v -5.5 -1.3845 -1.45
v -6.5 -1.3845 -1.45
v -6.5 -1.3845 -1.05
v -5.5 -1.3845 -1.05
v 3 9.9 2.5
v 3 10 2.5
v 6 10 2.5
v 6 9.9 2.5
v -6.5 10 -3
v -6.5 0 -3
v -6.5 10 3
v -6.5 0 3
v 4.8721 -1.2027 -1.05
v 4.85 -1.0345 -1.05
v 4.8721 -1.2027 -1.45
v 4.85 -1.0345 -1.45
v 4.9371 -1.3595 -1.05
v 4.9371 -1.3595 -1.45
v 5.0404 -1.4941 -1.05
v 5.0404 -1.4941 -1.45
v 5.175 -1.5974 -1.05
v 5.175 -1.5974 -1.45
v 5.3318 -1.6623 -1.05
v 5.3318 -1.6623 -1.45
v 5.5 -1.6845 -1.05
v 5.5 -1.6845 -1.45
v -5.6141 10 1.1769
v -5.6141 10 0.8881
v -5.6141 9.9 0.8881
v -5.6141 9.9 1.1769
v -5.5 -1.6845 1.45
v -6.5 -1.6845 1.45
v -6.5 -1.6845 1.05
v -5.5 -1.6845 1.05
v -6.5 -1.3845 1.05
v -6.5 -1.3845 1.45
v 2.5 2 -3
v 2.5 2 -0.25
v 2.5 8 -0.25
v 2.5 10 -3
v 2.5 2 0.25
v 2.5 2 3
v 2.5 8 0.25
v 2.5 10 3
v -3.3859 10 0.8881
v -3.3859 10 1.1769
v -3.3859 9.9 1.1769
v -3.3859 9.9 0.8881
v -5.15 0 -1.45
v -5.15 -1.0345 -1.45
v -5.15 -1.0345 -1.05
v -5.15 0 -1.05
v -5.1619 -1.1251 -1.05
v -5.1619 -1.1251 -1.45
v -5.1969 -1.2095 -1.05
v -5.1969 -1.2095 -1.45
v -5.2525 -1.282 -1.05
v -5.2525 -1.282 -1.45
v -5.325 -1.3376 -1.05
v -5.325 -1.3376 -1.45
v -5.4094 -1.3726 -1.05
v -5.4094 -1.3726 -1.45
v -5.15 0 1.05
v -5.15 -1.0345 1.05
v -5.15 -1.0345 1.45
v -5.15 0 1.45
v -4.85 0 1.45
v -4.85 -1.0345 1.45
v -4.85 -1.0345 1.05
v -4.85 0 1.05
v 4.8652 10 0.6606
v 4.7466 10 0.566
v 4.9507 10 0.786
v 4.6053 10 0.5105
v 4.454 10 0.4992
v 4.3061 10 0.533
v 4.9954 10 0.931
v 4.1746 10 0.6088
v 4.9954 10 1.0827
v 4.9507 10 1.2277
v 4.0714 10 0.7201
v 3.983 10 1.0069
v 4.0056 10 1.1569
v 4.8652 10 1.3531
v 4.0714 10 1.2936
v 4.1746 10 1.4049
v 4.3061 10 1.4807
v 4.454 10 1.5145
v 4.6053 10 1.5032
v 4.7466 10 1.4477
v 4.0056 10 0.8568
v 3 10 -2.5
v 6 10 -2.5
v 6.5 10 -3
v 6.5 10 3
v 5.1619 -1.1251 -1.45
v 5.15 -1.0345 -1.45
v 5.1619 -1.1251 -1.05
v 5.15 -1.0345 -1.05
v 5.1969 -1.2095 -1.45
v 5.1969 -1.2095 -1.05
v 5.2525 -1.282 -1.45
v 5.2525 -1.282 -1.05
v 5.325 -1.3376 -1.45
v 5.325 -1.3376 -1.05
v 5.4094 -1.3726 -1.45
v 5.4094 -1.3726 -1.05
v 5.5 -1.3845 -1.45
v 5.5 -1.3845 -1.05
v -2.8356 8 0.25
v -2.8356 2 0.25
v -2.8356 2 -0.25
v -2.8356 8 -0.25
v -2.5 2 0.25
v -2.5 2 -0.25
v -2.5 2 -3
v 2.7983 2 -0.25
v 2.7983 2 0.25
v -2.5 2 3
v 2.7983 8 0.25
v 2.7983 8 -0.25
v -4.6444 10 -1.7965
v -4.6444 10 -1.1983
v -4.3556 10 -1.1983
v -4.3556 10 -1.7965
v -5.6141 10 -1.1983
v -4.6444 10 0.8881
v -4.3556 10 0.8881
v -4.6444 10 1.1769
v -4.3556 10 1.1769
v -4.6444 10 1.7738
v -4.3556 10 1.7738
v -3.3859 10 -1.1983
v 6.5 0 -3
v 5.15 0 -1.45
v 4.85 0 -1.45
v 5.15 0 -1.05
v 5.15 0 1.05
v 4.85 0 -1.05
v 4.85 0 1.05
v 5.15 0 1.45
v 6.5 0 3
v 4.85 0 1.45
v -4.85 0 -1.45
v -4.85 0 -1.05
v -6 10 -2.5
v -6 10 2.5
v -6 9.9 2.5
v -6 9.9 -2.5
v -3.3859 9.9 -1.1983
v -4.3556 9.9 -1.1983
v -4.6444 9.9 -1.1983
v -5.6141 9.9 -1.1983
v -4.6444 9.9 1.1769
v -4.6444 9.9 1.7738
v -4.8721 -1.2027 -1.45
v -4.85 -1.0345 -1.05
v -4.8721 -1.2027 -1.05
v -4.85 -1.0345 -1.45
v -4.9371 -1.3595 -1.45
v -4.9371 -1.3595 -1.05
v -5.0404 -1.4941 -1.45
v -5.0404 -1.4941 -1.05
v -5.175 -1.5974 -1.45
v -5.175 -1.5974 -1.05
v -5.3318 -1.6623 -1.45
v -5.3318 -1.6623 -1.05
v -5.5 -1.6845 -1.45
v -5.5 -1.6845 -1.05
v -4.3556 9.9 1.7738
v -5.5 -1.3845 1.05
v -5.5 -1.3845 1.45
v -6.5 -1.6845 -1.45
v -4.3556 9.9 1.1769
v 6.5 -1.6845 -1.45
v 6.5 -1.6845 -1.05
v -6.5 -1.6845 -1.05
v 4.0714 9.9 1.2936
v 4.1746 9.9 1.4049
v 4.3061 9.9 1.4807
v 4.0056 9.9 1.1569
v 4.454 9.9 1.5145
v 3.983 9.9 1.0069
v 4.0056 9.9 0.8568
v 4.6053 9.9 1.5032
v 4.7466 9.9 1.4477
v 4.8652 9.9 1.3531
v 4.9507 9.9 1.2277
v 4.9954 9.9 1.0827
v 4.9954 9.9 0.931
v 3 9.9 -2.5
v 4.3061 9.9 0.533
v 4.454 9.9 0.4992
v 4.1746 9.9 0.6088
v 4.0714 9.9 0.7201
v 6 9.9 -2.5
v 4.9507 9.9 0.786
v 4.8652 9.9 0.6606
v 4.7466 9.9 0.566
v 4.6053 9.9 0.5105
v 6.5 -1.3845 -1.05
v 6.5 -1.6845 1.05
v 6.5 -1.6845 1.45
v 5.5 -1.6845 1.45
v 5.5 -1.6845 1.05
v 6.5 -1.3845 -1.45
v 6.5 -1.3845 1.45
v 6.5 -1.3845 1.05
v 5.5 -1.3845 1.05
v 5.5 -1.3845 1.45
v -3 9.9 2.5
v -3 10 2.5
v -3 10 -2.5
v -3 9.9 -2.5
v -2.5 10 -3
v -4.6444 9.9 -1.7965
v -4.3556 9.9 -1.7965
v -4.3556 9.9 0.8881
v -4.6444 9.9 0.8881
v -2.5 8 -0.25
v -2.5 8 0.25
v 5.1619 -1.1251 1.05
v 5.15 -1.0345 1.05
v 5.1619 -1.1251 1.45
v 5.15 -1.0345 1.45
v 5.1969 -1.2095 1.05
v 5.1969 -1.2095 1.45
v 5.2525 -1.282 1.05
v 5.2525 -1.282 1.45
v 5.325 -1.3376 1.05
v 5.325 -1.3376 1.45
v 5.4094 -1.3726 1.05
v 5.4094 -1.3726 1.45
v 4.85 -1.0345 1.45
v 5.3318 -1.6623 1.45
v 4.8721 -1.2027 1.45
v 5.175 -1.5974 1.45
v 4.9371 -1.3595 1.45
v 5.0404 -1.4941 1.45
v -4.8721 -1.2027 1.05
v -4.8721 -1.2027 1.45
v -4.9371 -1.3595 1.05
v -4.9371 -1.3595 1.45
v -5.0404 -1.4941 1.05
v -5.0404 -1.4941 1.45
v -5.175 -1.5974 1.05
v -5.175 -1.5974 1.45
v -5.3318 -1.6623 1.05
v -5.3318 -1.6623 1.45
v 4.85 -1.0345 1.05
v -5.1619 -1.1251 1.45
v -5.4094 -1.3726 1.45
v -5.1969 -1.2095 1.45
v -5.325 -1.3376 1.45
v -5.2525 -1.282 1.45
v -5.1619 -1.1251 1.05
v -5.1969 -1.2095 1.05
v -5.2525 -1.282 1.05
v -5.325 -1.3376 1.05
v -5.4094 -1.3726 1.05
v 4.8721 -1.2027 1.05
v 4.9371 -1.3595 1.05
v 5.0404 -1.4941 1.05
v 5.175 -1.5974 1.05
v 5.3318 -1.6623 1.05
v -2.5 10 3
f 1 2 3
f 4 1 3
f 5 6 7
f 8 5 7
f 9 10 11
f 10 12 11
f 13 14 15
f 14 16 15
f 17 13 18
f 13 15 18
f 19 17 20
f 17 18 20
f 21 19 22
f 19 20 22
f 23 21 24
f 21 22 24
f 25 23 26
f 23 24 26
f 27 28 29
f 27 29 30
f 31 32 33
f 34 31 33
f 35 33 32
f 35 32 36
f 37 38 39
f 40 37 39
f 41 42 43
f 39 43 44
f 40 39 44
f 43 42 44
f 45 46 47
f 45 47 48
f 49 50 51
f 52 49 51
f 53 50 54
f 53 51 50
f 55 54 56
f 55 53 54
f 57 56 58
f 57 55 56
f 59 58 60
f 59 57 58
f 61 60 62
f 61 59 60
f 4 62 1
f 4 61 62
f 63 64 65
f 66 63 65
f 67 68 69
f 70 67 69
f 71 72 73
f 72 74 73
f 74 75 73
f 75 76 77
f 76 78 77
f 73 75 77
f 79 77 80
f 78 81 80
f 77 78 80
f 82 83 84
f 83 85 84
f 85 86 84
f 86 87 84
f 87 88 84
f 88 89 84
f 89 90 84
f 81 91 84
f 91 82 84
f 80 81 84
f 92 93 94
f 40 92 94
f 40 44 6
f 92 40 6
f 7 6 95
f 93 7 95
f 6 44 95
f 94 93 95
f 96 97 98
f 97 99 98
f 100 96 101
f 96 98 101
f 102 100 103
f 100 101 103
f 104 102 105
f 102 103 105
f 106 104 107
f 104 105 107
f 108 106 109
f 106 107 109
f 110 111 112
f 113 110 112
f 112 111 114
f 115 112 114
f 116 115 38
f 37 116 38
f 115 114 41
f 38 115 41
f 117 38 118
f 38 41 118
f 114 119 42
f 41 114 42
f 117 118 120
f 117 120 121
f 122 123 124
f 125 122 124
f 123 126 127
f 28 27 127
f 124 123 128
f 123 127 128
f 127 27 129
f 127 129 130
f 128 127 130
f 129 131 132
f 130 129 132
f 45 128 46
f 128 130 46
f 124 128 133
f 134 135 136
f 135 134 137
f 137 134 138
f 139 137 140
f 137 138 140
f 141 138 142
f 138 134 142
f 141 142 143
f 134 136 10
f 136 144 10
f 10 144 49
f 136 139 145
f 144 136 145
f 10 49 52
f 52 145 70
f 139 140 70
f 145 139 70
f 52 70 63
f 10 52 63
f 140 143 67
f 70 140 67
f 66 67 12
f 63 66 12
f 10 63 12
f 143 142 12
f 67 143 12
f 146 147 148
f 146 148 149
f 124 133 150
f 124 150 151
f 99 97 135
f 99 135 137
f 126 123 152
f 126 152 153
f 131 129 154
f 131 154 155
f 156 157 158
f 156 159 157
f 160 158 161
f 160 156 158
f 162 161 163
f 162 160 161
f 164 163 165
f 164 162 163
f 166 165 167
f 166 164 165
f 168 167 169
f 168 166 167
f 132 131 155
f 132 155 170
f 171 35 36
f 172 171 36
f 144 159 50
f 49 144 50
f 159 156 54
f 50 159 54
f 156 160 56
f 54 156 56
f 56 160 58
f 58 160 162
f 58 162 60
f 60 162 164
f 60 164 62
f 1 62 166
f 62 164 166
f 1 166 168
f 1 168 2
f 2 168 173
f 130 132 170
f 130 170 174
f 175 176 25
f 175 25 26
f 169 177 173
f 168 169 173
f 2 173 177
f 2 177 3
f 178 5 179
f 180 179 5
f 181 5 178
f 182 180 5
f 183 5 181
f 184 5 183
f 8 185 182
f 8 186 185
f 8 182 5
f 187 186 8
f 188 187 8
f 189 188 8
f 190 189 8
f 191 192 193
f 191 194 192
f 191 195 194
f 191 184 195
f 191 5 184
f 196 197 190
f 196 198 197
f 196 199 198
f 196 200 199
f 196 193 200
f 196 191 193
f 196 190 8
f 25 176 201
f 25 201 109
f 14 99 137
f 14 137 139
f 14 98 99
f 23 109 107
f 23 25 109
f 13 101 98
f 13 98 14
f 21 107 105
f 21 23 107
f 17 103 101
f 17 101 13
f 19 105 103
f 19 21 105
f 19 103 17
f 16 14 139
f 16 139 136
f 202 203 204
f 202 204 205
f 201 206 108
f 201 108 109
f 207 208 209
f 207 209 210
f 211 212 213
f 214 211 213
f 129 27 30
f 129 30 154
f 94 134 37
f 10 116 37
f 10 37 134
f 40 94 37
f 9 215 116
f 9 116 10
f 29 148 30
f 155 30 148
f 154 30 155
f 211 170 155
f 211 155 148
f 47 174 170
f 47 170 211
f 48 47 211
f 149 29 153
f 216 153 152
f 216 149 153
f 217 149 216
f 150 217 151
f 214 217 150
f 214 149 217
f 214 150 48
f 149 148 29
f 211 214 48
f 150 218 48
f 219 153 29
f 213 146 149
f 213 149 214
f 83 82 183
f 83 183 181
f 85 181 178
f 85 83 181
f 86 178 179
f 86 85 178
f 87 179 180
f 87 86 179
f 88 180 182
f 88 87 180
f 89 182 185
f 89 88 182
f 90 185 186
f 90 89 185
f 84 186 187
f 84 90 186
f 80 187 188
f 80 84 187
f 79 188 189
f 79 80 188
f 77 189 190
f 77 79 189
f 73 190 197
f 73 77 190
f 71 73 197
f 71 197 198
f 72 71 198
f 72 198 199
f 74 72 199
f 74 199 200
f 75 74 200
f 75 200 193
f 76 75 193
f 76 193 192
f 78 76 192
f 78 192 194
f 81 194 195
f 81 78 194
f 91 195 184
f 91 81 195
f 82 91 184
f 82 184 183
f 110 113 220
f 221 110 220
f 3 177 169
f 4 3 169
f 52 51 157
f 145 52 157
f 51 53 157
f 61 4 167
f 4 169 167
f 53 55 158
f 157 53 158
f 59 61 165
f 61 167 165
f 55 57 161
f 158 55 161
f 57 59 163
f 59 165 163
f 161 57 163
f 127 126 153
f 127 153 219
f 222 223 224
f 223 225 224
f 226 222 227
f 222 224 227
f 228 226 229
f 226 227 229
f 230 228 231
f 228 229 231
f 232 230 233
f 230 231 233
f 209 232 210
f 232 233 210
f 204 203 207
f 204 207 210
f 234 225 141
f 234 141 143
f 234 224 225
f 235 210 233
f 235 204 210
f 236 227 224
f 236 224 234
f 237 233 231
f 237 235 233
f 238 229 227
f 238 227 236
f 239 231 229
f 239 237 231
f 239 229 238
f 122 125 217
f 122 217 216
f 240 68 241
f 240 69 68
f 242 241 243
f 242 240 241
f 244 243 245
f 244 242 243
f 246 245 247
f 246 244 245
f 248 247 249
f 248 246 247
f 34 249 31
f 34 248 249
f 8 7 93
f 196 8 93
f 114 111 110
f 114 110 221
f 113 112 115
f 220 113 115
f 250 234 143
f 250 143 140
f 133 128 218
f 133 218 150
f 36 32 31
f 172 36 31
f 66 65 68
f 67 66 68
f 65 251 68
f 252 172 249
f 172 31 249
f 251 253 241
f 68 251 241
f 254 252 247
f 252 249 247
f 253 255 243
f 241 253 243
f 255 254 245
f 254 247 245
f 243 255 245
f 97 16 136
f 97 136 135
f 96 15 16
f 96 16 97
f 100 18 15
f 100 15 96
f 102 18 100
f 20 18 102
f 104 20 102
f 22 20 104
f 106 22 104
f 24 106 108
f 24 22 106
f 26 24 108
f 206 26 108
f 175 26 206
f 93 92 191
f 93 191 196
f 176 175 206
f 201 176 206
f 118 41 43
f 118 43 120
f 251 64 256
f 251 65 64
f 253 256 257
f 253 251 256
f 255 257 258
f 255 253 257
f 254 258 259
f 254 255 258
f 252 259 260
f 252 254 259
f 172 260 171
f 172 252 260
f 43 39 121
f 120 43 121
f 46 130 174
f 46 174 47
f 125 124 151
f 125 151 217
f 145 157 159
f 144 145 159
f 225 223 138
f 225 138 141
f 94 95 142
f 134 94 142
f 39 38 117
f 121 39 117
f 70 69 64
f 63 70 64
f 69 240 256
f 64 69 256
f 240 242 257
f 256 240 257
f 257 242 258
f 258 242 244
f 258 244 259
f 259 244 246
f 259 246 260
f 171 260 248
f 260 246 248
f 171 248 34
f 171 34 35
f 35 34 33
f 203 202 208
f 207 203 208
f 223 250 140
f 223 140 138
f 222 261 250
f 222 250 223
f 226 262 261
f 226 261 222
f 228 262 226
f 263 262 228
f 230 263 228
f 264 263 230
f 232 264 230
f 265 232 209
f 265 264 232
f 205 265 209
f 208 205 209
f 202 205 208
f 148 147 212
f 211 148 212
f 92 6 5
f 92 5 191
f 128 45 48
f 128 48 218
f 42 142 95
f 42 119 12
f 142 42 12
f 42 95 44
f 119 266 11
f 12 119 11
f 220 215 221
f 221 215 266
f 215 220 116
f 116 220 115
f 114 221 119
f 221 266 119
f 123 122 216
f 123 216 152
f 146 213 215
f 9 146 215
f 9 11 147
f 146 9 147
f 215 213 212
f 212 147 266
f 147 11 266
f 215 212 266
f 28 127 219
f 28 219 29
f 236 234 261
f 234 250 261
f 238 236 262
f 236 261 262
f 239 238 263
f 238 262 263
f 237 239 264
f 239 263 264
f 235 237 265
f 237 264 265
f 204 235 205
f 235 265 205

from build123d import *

# Parameters (mm, degrees)
BASE_DEPTH      = 3
SKETCH2_W       = 3
SKETCH2_H       = 5
SKETCH2_R       = 0.509076859
POLARITY_DEPTH  = 0.1
SKETCH3_W       = 0.671157402
SKETCH3_H       = 0.5
SKETCH3_W_2     = 0.596513076
LIGHTSLOT_DEPTH = 6
SKETCH4_W       = 0.3
SKETCH4_H       = 0.4


with BuildPart() as part:
    # Sketch1 → Base (new, symmetric)
    with BuildSketch(Plane.XY):
        Polygon((6.5, 0), (-6.5, 0), (-6.5, 10), (-2.5, 10), (-2.5, 2), (2.5, 2), (2.5, 10), (6.5, 10), align=None)
    extrude(amount=BASE_DEPTH, both=True)

    # Sketch2 → Polarity (cut)
    # profile 1 of 2: a face of its own
    with BuildSketch(Plane(origin=(0, 10, 0), x_dir=(1, 0, 0), z_dir=(0, 1, 0))):
        with Locations((-4.5, 0)):
            Rectangle(SKETCH2_W, SKETCH2_H)
        Polygon((-4.644390506, 1.198307086), (-5.614083966, 1.198307086), (-4.644390506, -0.88812109), (-5.614083966, -0.88812109), (-5.614083966, -1.176902103), (-4.644390506, -1.176902103), (-4.644390506, -1.773829525), (-4.355609494, -1.773829525), (-4.355609494, -1.176902103), (-3.385916034, -1.176902103), (-3.385916034, -0.88812109), (-4.355609494, -0.88812109), (-3.385916034, 1.198307086), (-4.355609494, 1.198307086), (-4.355609494, 1.796472229), (-4.644390506, 1.796472229), align=None, mode=Mode.SUBTRACT)
    # profile 2 of 2: a face of its own
    with BuildSketch(Plane(origin=(0, 10, 0), x_dir=(1, 0, 0), z_dir=(0, 1, 0))):
        with Locations((4.5, 0)):
            Rectangle(SKETCH2_W, SKETCH2_H)
        with Locations(Location((4.492051803, -1.006853172, 0), (0, 0, 180))):
            Circle(SKETCH2_R, mode=Mode.SUBTRACT)
    extrude(amount=-POLARITY_DEPTH, mode=Mode.SUBTRACT)

    # Sketch3 → LightSlot (cut)
    with BuildSketch(Plane(origin=(0, 2, 0), x_dir=(1, 0, 0), z_dir=(0, 1, 0))):
        with Locations((-2.5, 0)):
            Rectangle(SKETCH3_W, SKETCH3_H)
        with Locations((2.5, 0)):
            Rectangle(SKETCH3_W_2, SKETCH3_H)
    extrude(amount=LIGHTSLOT_DEPTH, mode=Mode.SUBTRACT)

    # Sweep1: sweep along a curve in space
    with BuildLine() as sweep1_path:
        Line((5, 0, 1.25), (5, -1.034487075, 1.25))
        ThreePointArc((5, -1.034487075, 1.25), (5.146446609, -1.388040466, 1.25), (5.5, -1.534487075, 1.25))
        Line((5.5, -1.534487075, 1.25), (6.5, -1.534487075, 1.25))
    # Sketch4 → Sweep1 (sweep)
    with BuildSketch(Plane.XZ):
        with Locations((5, 1.25)):
            Rectangle(SKETCH4_W, SKETCH4_H)
        with Locations((5, -1.25)):
            Rectangle(SKETCH4_W, SKETCH4_H)
    sweep1 = sweep(path=sweep1_path.line)

    # Mirror1: Sweep1 across plane
    add(sweep1.mirror(Plane(origin=(0, 0, 0), x_dir=(0, 0, 1), z_dir=(1, 0, 0))))


solid = part.part
